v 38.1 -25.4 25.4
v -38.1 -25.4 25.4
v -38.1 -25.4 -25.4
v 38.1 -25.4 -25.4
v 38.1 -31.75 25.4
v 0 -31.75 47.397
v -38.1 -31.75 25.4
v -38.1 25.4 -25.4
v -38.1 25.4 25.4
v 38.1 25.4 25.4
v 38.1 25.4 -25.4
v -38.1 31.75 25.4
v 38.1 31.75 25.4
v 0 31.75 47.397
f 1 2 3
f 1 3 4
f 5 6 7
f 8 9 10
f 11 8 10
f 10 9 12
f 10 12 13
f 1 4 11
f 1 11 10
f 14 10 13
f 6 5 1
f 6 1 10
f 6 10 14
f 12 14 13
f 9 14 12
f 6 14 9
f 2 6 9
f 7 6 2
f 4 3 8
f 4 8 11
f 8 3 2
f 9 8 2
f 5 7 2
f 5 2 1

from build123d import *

# Parameters (mm, degrees)
F0_W     = 76.2
F0_H     = 50.8
F1_DEPTH = 25.4
F2_DEPTH = 31.75


with BuildPart() as f1:
    # F0 (on Front) → F1 (new body, symmetric)
    with BuildSketch(Plane.XZ):
        Rectangle(F0_W, F0_H)
    extrude(amount=F1_DEPTH, both=True)

    # F0 (on Front) → F2 (join, symmetric)
    with BuildSketch(Plane.XZ):
        Polygon((0, 47.397045), (-38.1, 25.4), (38.1, 25.4), align=None)
    extrude(amount=F2_DEPTH, both=True)


solid = f1.part
